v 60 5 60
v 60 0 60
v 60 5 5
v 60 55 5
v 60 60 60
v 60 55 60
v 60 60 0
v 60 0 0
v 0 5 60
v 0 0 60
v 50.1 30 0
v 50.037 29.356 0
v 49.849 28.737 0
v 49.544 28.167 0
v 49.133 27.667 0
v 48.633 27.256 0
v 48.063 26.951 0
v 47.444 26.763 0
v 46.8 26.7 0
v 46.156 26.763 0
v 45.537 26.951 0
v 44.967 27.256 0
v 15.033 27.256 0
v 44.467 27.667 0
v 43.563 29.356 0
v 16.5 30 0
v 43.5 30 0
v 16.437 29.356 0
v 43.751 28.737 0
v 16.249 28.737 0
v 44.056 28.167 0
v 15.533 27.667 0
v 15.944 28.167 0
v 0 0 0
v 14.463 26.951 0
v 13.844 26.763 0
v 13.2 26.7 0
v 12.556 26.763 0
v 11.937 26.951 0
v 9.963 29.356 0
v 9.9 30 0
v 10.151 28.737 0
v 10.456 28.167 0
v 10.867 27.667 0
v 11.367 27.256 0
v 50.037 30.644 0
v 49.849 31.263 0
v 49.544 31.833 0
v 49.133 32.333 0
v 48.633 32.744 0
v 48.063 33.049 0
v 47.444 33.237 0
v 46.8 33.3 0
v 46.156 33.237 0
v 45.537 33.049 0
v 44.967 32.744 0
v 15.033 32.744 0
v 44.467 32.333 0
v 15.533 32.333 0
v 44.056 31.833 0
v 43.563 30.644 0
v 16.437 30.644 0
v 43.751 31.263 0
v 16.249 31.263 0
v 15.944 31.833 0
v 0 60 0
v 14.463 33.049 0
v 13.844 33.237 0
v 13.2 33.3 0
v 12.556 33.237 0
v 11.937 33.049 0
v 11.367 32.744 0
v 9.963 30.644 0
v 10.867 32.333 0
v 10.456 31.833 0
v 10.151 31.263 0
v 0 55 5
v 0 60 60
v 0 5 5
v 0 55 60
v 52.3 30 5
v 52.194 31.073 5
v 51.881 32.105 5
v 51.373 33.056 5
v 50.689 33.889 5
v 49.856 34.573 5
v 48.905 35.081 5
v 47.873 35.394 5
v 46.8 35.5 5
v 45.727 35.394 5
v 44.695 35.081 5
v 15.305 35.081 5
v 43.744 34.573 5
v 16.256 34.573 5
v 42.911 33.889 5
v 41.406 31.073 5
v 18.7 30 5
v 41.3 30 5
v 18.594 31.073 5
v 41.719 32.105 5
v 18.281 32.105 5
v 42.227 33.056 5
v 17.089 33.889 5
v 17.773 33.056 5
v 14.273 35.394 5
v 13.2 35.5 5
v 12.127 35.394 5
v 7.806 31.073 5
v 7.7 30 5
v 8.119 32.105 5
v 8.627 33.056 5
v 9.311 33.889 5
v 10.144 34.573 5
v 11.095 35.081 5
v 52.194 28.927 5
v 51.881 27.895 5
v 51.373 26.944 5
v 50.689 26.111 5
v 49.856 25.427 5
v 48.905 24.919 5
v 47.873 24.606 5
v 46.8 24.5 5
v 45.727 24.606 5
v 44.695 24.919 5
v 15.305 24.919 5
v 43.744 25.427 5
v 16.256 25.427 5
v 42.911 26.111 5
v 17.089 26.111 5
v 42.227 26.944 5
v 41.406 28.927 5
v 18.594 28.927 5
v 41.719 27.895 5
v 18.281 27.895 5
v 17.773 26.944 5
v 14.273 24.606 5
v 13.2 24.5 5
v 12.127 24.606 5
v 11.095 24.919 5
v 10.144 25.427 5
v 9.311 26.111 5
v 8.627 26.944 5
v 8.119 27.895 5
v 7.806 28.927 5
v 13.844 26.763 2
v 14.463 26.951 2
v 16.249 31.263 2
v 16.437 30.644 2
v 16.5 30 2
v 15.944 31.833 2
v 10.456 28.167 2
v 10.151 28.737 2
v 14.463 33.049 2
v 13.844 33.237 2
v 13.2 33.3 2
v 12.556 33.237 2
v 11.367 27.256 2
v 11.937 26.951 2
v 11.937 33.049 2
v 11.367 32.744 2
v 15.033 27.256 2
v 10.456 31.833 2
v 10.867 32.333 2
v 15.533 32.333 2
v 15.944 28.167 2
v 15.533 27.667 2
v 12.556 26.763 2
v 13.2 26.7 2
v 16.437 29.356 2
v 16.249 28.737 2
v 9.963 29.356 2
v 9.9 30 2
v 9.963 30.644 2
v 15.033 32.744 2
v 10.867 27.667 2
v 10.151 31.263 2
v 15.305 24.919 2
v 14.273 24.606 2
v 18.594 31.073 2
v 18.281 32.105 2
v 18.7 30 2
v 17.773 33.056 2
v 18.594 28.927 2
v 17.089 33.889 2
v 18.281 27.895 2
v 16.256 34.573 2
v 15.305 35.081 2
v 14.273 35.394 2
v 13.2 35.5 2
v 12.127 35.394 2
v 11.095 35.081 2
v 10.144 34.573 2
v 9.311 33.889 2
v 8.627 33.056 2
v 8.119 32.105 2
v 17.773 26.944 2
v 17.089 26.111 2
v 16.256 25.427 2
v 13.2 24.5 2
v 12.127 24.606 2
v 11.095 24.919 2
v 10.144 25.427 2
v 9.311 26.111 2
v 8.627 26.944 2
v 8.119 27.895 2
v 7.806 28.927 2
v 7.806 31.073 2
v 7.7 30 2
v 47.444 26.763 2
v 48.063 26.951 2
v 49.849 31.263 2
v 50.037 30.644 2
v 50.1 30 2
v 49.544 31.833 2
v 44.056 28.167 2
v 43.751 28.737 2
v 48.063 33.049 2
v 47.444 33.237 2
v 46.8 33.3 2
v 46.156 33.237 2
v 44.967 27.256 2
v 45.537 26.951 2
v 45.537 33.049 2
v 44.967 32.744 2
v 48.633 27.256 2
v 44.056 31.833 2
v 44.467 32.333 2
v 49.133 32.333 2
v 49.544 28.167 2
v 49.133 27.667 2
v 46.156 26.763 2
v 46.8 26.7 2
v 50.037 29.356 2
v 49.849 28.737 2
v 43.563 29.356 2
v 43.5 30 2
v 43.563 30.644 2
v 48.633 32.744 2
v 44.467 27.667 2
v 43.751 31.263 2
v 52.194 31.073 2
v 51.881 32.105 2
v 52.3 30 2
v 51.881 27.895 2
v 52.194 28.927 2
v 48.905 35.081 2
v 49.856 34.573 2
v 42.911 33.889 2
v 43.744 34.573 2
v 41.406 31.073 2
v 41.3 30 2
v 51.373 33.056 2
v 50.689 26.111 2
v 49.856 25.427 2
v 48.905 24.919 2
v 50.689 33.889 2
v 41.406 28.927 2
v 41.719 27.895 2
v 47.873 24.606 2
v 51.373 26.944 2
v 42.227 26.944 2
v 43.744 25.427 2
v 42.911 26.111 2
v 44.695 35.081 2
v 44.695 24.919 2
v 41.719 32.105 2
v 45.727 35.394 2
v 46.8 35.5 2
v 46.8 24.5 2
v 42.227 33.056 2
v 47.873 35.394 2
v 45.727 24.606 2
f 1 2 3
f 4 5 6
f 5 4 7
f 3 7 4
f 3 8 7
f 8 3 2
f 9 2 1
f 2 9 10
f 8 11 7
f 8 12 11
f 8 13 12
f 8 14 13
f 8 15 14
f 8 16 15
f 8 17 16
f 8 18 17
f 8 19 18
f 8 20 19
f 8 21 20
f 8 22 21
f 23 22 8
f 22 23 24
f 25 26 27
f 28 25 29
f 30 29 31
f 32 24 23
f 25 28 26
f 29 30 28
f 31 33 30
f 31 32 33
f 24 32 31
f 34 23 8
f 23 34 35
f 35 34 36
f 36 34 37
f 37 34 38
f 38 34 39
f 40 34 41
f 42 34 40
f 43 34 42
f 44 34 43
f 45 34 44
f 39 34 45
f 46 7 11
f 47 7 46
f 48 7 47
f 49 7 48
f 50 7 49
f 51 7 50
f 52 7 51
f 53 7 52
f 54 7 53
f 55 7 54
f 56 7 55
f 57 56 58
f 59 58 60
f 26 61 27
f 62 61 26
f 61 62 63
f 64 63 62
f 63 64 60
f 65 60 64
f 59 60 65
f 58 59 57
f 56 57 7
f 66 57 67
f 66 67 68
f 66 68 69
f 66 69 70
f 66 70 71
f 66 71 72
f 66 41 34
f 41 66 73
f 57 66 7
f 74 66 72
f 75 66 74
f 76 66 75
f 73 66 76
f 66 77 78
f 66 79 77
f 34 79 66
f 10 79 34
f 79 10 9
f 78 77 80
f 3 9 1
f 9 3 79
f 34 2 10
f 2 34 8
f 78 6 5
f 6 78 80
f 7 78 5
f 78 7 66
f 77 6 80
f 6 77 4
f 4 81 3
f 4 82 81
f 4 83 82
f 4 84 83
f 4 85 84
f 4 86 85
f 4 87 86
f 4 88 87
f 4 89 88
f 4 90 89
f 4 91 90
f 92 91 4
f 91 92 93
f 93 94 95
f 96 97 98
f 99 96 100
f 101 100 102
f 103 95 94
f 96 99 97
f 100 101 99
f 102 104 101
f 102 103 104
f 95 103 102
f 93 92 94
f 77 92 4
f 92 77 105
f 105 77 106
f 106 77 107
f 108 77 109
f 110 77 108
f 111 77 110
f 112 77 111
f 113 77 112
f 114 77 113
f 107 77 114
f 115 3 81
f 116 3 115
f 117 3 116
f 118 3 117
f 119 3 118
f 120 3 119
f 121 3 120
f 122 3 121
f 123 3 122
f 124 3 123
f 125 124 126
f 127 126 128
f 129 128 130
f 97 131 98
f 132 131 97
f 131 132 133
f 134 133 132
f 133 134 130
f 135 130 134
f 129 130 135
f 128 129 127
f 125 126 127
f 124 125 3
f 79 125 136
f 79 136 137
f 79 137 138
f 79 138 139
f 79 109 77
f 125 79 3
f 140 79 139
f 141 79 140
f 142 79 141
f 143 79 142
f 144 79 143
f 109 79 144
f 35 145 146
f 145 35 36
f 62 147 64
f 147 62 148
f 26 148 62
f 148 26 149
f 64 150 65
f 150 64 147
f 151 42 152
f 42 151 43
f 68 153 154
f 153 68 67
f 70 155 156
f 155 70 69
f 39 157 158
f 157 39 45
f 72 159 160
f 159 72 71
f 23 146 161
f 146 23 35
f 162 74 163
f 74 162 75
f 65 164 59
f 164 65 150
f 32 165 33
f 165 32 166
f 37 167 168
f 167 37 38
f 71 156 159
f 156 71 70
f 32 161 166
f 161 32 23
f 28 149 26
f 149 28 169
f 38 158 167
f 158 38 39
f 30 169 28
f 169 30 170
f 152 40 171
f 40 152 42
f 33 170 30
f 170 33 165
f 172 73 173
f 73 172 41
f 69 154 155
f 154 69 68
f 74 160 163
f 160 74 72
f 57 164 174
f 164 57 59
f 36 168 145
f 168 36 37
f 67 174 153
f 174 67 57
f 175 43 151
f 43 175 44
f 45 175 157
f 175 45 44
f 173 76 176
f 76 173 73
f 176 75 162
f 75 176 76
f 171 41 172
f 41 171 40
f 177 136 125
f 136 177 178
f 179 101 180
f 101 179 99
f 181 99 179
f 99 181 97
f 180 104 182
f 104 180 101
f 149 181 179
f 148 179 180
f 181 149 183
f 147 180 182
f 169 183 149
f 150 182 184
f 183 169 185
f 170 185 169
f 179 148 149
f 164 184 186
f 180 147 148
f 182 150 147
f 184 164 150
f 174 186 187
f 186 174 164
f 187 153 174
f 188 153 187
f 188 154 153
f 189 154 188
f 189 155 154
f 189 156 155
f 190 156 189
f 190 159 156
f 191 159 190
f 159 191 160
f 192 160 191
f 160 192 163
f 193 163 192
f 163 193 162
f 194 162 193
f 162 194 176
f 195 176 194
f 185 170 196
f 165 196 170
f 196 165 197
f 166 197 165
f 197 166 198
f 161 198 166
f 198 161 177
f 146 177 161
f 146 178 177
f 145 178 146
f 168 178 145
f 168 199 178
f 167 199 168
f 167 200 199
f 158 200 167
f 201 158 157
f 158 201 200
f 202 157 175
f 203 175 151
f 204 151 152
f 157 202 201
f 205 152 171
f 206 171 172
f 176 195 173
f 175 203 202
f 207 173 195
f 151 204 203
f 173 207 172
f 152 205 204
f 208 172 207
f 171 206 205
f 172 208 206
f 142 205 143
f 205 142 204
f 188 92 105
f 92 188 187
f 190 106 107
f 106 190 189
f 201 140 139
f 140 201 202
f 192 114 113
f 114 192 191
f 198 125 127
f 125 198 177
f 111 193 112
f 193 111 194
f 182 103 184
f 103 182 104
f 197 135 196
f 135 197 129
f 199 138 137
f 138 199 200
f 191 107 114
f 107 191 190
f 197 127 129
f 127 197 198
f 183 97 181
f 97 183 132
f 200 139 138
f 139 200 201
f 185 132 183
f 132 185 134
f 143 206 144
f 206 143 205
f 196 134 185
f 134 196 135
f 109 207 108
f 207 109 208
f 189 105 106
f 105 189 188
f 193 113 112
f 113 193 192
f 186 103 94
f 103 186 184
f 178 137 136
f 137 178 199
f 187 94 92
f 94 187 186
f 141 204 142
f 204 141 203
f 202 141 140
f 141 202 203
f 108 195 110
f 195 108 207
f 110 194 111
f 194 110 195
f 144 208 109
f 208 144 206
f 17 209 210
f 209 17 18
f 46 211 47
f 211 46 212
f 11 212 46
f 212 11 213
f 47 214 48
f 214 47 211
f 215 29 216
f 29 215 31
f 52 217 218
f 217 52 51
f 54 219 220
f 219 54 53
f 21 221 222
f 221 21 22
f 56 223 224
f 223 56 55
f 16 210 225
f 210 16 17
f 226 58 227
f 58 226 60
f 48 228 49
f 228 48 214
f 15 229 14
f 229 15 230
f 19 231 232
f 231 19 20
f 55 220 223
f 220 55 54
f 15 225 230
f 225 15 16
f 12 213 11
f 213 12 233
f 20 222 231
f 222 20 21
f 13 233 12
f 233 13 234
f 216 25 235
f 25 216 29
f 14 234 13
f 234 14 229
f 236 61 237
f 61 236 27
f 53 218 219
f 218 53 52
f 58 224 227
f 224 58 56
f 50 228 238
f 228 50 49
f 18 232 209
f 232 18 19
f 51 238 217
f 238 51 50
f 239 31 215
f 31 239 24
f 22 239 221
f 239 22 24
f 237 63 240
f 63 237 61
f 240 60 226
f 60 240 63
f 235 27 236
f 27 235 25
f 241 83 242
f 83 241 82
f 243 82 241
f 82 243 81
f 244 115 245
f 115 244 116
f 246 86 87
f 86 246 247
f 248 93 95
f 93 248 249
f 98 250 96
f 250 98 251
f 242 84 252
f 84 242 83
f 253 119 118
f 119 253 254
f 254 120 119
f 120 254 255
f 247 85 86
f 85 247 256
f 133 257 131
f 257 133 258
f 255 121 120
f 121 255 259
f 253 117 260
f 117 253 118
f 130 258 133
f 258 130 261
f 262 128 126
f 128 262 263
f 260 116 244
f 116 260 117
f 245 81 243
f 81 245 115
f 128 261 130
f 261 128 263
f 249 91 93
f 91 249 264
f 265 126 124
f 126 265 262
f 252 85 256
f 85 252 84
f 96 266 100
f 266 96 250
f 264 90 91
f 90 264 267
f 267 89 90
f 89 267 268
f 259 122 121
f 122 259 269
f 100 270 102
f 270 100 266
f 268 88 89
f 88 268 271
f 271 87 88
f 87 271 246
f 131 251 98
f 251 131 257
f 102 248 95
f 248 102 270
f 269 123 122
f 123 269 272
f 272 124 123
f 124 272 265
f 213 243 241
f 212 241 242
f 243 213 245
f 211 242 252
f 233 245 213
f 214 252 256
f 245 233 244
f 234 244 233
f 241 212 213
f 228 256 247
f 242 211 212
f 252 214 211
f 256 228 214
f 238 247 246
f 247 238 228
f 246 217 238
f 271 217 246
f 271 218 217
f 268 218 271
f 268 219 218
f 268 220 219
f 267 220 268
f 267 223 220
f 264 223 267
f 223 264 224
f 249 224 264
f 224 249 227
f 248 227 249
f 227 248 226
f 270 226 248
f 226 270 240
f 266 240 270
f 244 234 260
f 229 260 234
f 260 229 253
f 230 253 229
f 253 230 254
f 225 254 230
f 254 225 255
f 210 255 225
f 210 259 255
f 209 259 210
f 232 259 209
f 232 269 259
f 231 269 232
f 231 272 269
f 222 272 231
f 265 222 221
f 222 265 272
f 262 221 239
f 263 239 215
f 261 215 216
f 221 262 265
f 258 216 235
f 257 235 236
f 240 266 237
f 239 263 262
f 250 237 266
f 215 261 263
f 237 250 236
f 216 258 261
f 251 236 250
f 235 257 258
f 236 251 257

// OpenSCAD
$fn = 32;

// ----------------------------------------------------------------------
// U-bracket: 60 x 60 x 60 mm
// ----------------------------------------------------------------------

// --- parameters (mm) ---
rail_len = 60;            // outer length, X
jaw_w = 60;               // outer width, Y
jaw_h = 60;               // upright height, Z
web_t = 5;                // wall thickness
hole_d = 6.6;             // clearance for M6
cb_d = 11;                // counterbore diameter
cb_h = 3;                 // counterbore depth

module hole_z(px, py) {
  translate([px, py, -2.5]) cylinder(h = web_t + 5, d = hole_d);
}
module hole_y_pz(pz) {
  /* through both uprights along Y */
  translate([0, -2.5, pz]) rotate([-90, 0, 0]) cylinder(h = jaw_w + 5, d = hole_d);
}
module cb_z(px, py) {
  translate([px, py, web_t - cb_h]) cylinder(h = cb_h + 0.4, d = cb_d);
}

module base() {
  cube([rail_len, jaw_w, web_t]);
}

module uprights() {
  cube([rail_len, web_t, jaw_h]);
  translate([0, jaw_w - web_t, 0]) cube([rail_len, web_t, jaw_h]);
}

difference() {
  union() {
    base();
    uprights();
  }
  hole_z(13.2, 30);
  cb_z(13.2, 30);
  hole_z(46.8, 30);
  cb_z(46.8, 30);
}
